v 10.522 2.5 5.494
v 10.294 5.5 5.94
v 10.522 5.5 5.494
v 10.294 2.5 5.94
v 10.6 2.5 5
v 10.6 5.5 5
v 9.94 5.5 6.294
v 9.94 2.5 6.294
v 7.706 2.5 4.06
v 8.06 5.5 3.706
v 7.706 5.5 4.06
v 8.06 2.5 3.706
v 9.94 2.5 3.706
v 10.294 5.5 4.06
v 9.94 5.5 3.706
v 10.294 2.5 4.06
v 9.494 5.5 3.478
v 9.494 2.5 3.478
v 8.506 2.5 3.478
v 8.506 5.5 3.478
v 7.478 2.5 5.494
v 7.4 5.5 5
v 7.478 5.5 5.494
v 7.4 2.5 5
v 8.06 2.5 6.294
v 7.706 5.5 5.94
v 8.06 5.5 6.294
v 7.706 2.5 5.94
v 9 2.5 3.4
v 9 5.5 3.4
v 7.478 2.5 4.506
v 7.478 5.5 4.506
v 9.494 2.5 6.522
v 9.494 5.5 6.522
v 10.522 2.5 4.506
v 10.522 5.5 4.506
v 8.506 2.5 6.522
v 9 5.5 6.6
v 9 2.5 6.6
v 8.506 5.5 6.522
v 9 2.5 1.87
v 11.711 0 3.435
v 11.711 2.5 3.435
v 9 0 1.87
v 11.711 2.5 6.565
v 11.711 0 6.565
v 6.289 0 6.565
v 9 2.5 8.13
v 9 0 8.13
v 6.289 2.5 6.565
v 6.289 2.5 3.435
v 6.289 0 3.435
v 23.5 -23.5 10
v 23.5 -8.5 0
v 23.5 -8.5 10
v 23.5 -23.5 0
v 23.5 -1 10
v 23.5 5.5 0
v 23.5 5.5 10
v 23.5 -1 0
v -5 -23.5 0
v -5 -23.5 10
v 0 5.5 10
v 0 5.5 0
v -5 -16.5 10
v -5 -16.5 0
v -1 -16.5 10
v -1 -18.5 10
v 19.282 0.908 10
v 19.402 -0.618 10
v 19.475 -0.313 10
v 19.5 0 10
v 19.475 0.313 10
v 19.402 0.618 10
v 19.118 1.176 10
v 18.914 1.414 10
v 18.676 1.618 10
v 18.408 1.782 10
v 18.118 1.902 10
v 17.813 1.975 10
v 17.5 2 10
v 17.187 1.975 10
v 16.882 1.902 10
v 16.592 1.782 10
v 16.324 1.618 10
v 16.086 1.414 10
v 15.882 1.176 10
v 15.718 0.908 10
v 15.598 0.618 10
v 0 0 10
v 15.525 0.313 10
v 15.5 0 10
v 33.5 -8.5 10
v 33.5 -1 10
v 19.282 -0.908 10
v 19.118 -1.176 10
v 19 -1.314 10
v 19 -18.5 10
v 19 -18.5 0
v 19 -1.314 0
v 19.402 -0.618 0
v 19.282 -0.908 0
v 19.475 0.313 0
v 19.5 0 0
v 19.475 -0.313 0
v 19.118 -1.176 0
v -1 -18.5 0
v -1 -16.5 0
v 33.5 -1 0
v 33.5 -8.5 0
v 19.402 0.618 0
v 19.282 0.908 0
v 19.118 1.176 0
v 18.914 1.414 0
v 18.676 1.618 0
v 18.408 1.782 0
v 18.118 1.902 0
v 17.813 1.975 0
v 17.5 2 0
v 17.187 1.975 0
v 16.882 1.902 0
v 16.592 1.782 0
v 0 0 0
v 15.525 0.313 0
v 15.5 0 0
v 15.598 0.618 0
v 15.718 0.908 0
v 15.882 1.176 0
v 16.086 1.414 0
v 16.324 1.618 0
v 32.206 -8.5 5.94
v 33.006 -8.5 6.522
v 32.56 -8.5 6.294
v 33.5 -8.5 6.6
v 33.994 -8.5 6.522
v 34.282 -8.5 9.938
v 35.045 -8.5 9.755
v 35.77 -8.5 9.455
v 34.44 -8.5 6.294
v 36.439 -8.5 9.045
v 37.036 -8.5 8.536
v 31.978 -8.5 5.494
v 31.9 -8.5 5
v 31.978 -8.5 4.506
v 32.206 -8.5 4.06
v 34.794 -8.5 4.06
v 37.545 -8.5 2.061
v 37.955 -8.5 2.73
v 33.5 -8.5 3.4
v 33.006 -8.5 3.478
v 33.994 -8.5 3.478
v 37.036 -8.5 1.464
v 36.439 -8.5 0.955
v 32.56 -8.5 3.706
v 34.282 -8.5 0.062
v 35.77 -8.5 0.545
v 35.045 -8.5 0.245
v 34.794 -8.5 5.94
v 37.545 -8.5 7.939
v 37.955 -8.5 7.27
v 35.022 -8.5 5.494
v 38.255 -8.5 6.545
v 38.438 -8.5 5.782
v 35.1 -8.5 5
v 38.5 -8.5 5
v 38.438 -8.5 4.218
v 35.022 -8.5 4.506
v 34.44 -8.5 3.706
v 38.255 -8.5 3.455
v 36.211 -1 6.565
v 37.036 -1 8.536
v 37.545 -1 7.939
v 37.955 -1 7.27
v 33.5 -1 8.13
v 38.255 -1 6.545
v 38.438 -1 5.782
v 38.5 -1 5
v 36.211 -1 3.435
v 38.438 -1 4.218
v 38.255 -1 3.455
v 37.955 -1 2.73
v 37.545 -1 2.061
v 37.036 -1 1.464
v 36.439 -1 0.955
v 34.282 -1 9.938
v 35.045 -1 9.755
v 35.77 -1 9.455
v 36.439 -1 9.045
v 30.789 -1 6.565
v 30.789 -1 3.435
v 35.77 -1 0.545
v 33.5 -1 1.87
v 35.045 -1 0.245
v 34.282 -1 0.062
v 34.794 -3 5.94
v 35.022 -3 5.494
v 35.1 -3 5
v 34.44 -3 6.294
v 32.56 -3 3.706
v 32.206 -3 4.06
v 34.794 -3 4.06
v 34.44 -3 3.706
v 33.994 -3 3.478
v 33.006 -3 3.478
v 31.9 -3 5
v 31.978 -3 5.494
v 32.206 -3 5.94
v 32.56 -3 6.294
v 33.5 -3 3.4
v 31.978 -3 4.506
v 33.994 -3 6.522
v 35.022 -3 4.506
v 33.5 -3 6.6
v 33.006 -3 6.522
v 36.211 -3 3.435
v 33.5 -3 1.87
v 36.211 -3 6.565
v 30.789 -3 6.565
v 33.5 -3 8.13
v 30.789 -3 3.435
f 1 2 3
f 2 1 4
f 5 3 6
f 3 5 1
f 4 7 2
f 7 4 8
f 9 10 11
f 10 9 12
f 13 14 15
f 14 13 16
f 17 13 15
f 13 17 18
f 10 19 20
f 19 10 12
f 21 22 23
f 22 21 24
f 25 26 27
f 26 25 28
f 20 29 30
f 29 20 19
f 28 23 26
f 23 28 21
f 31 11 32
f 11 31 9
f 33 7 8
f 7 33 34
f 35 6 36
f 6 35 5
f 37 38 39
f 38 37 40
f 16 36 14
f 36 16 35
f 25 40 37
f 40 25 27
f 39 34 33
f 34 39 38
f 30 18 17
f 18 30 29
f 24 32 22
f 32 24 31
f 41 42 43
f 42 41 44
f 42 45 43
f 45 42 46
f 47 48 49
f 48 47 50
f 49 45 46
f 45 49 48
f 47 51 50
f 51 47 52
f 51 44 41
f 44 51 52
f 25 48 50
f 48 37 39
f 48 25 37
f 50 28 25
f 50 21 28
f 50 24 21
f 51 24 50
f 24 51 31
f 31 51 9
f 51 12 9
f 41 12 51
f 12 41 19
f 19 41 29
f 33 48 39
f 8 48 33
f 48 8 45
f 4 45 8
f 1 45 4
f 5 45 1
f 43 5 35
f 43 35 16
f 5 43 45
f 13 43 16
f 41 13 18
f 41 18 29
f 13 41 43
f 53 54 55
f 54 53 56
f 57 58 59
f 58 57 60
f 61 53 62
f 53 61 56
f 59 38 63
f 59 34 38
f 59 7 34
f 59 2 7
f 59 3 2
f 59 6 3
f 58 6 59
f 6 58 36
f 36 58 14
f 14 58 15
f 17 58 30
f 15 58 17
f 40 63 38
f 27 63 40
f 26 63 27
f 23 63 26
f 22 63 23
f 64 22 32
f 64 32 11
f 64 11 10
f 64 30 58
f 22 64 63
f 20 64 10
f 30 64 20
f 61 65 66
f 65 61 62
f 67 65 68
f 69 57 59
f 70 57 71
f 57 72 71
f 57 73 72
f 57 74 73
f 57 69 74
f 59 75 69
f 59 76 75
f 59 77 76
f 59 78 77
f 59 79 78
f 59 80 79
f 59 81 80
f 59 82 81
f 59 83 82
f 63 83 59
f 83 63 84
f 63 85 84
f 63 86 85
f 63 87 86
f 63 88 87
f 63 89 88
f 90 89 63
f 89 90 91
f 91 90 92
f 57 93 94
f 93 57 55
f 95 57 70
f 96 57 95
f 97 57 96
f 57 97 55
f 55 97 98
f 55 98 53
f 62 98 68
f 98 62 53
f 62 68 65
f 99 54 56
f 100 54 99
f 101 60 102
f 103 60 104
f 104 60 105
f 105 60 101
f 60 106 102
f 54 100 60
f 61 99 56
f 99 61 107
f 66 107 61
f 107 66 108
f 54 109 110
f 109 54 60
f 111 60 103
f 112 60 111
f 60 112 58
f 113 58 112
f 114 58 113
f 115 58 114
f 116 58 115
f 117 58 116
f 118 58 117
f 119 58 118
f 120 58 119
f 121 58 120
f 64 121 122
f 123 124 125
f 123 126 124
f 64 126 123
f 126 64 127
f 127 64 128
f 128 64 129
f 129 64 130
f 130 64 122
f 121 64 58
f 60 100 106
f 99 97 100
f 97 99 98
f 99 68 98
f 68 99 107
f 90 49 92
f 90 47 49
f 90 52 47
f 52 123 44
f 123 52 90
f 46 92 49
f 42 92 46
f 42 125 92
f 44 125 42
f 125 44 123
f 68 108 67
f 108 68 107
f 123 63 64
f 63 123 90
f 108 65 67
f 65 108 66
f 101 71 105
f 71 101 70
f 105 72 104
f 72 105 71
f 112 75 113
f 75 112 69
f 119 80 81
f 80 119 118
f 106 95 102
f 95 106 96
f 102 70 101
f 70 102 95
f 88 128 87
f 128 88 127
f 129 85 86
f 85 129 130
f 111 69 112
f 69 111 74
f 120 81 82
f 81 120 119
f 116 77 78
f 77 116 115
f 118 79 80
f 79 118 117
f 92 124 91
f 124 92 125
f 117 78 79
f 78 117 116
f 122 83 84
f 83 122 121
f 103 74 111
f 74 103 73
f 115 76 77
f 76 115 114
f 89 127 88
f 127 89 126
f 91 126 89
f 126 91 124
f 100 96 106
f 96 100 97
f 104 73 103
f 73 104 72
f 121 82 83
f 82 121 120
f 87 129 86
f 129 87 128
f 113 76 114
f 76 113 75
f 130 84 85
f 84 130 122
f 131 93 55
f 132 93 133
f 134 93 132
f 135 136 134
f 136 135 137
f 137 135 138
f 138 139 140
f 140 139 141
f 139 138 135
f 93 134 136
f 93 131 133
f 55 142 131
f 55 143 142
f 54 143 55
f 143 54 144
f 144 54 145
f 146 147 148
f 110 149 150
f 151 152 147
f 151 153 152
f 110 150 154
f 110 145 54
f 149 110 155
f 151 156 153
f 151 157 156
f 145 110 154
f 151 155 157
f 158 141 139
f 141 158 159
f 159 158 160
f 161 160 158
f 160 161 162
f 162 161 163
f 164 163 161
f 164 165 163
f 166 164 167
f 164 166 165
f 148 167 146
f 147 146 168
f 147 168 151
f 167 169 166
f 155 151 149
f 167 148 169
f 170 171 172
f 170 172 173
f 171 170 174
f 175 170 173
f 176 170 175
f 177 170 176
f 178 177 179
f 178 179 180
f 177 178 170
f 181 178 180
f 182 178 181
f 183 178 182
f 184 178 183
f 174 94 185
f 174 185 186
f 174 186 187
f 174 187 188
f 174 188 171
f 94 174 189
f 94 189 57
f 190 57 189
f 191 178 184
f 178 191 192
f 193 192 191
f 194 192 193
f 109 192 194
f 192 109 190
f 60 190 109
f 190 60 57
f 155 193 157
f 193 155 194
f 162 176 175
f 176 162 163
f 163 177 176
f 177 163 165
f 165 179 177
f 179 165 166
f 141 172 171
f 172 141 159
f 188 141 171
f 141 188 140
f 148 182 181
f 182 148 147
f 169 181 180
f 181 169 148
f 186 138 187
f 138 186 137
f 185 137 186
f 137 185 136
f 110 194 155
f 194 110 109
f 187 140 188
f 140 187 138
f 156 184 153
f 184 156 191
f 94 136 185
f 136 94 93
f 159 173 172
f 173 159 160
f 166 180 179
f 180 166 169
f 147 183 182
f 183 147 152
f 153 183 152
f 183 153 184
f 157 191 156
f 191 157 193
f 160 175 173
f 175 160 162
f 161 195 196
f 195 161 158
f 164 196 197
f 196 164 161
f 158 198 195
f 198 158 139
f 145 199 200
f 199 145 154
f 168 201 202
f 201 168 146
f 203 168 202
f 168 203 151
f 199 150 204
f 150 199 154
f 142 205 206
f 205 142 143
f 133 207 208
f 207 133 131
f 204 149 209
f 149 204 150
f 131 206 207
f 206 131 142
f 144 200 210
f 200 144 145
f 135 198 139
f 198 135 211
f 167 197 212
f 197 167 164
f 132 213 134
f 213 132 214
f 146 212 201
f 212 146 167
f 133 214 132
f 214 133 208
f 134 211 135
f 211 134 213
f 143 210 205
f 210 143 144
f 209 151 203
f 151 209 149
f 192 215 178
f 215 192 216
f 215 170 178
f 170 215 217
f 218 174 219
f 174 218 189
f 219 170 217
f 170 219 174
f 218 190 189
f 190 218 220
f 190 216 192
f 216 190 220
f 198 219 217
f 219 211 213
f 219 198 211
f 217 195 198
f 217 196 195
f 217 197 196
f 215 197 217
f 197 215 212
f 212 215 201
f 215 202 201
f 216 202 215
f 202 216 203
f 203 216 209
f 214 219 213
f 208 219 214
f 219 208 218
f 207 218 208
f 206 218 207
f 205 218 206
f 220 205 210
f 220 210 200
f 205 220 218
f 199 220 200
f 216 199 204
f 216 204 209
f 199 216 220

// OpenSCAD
// file: inc/functions.scad
// PRUSA iteration3
// Functions used in many files
// GNU GPL v3
// Josef Průša <josefprusa@me.com>
// Václav 'ax' Hůla <axtheb@gmail.com>
// Vlnofka <>
// http://www.reprap.org/wiki/Prusa_Mendel
// http://github.com/prusajr/PrusaMendel

module roundcorner(diameter){
	difference(){
		cube(size = [diameter,diameter,99], center = false);
		translate(v = [diameter, diameter, 0]) cylinder(h = 100, r=diameter, center=true);
	}
}
module nut(d,h,horizontal=true){
    cornerdiameter =  (d / 2) / cos (180 / 6);
    cylinder(h = h, r = cornerdiameter, $fn = 6);
    if(horizontal){
        for(i = [1:6]){
            rotate([0,0,60*i]) translate([-cornerdiameter-0.2,0,0]) rotate([0,0,-45]) cube([2,2,h]);
        }
    }
}

// Based on nophead research
module polyhole(d, h, center=false) {
    n = max(round(2 * d),3);
    rotate([0,0,180])
        cylinder(h = h, r = (d / 2) / cos (180 / n), $fn = n);
}

// make it interchangeable between this and cylinder
module cylinder_poly(r, h, center=false){
    polyhole(d=r*2, h=h, center=center);
}

module fillet(radius, height=100, $fn=0) {
    //this creates acutal fillet
    translate([-radius, -radius, -height/2-0.01])
        difference() {
            cube([radius*2, radius*2, height+0.02]);
            cylinder(r=radius, h=height+0.02, $fn=$fn);
        }
}

module cube_fillet(size, radius=-1, vertical=[3,3,3,3], top=[0,0,0,0], bottom=[0,0,0,0], center=false, $fn=0){
    //
    if (center) {
        cube_fillet_inside(size, radius, vertical, top, bottom, $fn);
    } else {
        translate([size[0]/2, size[1]/2, size[2]/2])
            cube_fillet_inside(size, radius, vertical, top, bottom, $fn);
    }
}

module cube_negative_fillet(size, radius=-1, vertical=[3,3,3,3], top=[0,0,0,0], bottom=[0,0,0,0], $fn=0){

    j=[1,0,1,0];

    for (i=[0:3]) {
        if (radius > -1) {
            rotate([0, 0, 90*i]) translate([size[1-j[i]]/2, size[j[i]]/2, 0]) fillet(radius, size[2], $fn=$fn);
        } else {
            rotate([0, 0, 90*i]) translate([size[1-j[i]]/2, size[j[i]]/2, 0]) fillet(vertical[i], size[2], $fn=$fn);
        }
        rotate([90*i, -90, 0]) translate([size[2]/2, size[j[i]]/2, 0 ]) fillet(top[i], size[1-j[i]], $fn=$fn);
        rotate([90*(4-i), 90, 0]) translate([size[2]/2, size[j[i]]/2, 0]) fillet(bottom[i], size[1-j[i]], $fn=$fn);

    }
}

module cube_fillet_inside(size, radius=-1, vertical=[3,3,3,3], top=[0,0,0,0], bottom=[0,0,0,0], $fn=0){
    //makes CENTERED cube with round corners
    // if you give it radius, it will fillet vertical corners.
    //othervise use vertical, top, bottom arrays
    //when viewed from top, it starts in upper right corner (+x,+y quadrant) , goes counterclockwise
    //top/bottom fillet starts in direction of Y axis and goes CCW too


    if (radius == 0) {
        cube(size, center=true);
    } else {
        difference() {
            cube(size, center=true);
            cube_negative_fillet(size, radius, vertical, top, bottom, $fn);
        }
    }
}


module nema17(places=[1,1,1,1], size=15.5, h=10, holes=false, shadow=false, $fn=24){
    for (i=[0:3]) {
        if (places[i] == 1) {
            rotate([0, 0, 90*i]) translate([size, size, 0]) {
                if (holes) {
                    #rotate([0, 0, -90*i])  translate([0,0,-10]) screw(r=1.7, slant=false, head_drop=13, $fn=$fn, h=h+12);
                } else {
                    rotate([0, 0, -90*i]) cylinder(h=h, r=5.5, $fn=$fn);
                }
            }
        }
    }
    if (shadow != false) {
        %translate ([0, 0, shadow+21+3]) cube([42,42,42], center = true);
    //flange
        %translate ([0, 0, shadow+21+3-21-1]) cylinder(r=11,h=2, center = true, $fn=20);
    //shaft
        %translate ([0, 0, shadow+21+3-21-7]) cylinder(r=2.5,h=14, center = true);
    }
}

module screw(h=20, r=2, r_head=3.5, head_drop=0, slant=true, poly=false, $fn=0){
    //makes screw with head
    //for substraction as screw hole
    if (poly) {
        cylinder_poly(h=h, r=r, $fn=$fn);
    } else {
        cylinder(h=h, r=r, $fn=$fn);
    }
    if (slant) {
        translate([0, 0, head_drop-0.01]) cylinder(h=r_head, r2=0, r1=r_head, $fn=$fn);
    }

    if (head_drop > 0) {
        translate([0, 0, -0.01]) cylinder(h=head_drop+0.01, r=r_head, $fn=$fn);
    }
}
module screw_cylinder(r_head=5.25,r=3.25,head_drop=6.2,slant=false){
	screw(r_head=r_head,head_drop=head_drop,r=r, slant=slant);

}

//screw_cylinder();
//cube_fillet([10,20,30], vertical=[3,2,0,0], top=[3,2,0,5], bottom=[3,2,0,5]);
//cube_fillet([10,20,30], radius=2, top=[7,2,7,2]);
// file: inc/metric.scad
// PRUSA Mendel
// Default metric sizes
// GNU GPL v3
// Josef Pruša
// josefprusa@me.com
// prusadjs.cz
// http://www.reprap.org/wiki/Prusa_Mendel
// http://github.com/prusajr/PrusaMendel
// DONT CHANGE THIS FILE! ALTER VALUES IN CONFIGURATION.SCAD INSTEAD
// RODS
threaded_rod_diameter = 8.7;
threaded_rod_diameter_horizontal = 8.7;
smooth_bar_diameter = 8;
smooth_bar_diameter_horizontal = 8.5;
// Nuts and bolts
m8_diameter = 9;
m8_nut_diameter = 14.1;
m4_diameter = 4.5;
m4_nut_diameter = 9;
m3_diameter = 3.6;
m3_nut_diameter = 5.3;
m3_nut_diameter_horizontal = 6.1;
// Bushing holder
bushing_core_diameter = smooth_bar_diameter;
bushing_material_thickness = 1;
// Motors
motor_shaft = 5.5;
// file: configuration.scad
// PRUSA iteration3
// Configuration file
// GNU GPL v3
// Josef Pruša <josefprusa@me.com>
// Václav 'ax' Hula <axtheb@gmail.com>
// http://www.reprap.org/wiki/Prusa_Mendel
// http://github.com/prusajr/PrusaMendel
// PLEASE SELECT ONE OF THE CONFIGURATIONS BELOW
// BY UN-COMMENTING IT
// Uncomment for metric settings
// METRIC METRIC METRIC METRIC METRIC METRIC METRIC METRIC
include <inc/metric.scad>;
// Custom settings here, tailor to your supplies and print settings
// Select your belt type ******************************************************
//T2.5
belt_tooth_distance = 2.5;
belt_tooth_ratio = 0.5;
//T5 (strongly discouraged)
//belt_tooth_distance = 5;
//belt_tooth_ratio = 0.75;
//HTD3
//belt_tooth_distance = 3;
//belt_tooth_ratio = 0.75;
//MXL
//belt_tooth_distance = 2.032;
//belt_tooth_ratio = 0.64;
// Choose bearing/bushing configuration ***************************************
//Choose from:
// 0 = Z as lm[e]8uu, X and Y bushings
// 1 = all bushings
// 2 = all bearings [default. Do not change unless you really know what you are doing]
// DO NOT OFFER 0 or 1 VARIANTS FOR SALE. We really mean that. In the long run it hurts everyone.
bearing_choice = 2;
// Bushing version
// 0 = square igus housings. By igus we mean JFM-0810-10 or GFM-0810-10
// 1 = round igus (works better if printed precisely)
// 2 = bronze self-aligning bushings
bushing_type = 0;
//Bearing version
// 0 = default lm8uu
// 1 = lme8uu
bearing_type = 0;
// Select idler bearing size **************************************************
// 0 = 608 [standard skate bearings]
// 1 = 624 [roughly same diameter as pulley, makes belt parallel so its prettier]
idler_bearing = 0;
// Thickness of the XZ plate board
board_thickness = 16;
//Layer height * width over thickness. Used for idler sleeve
single_wall_width = 0.3*2.2;
// END of custom settings
// You are not supposed to change this
board_to_xz_distance = 26;
xaxis_rod_distance = 45;
carriage_l = 74;
carriage_hole_to_side = 5;
carriage_hole_height = 4;
//calculated from settings
idler_size = (idler_bearing == 0) ? 22 : 13;
//use 4.5 for 608, 2.5 for 624
idler_size_inner_r = (idler_bearing == 0) ? 4.5 : 2.5;
idler_width = (idler_bearing == 0) ? 9 : 5;
// CHANGE ONLY THE STUFF YOU KNOW
// IT WILL REPLACE DEFAULT SETTING
// RODS
// threaded_rod_diameter = 0;
// threaded_rod_diameter_horizontal = 0;
// smooth_bar_diameter = 0;
// smooth_bar_diameter_horizontal = 0;
// Nuts and bolts
// m8_diameter = 0;
// m8_nut_diameter = 0;
// m4_diameter = 0;
// m4_nut_diameter = 0;
// m3_diameter = 0;
// m3_nut_diameter = 0;
// Bushing holder
// bushing_core_diameter = smooth_bar_diameter;
// bushing_material_thickness = 0;
///counted stuff
m3_nut_diameter_bigger = ((m3_nut_diameter / 2) / cos (180 / 6))*2;
// functions
include <inc/functions.scad>
// These constants define the geometry of the complete-printer.scad
x_smooth_rod_length=325;
y_smooth_rod_length=405;
z_smooth_rod_length=235;
bed_x_size=225;
bed_y_size=225;
// main file
include <configuration.scad>

m3_diameter = 3.2;
m3_nut_diameter = m3_diameter * 1.8 + .5;
m3_nut_diameter_bigger = m3_nut_diameter;
xend_height=18;
xend_length=40;
z_stop_mount_hole_depth=xend_height;
z_stop_mount_hole_height=xend_height;
z_stop_mount_thick=5.5;
z_stop_mount_space=.5;
z_stop_mount_width=10;
z_stop_wing_length=15;

zcompanion();

//translate([45,-33,0])
//rotate ([0,0,180]) 
//zcompanion();

module zcompanion()
{
	rotate ([90,0,0]) 
	translate([0,0,0])
	zmount();
	//translate([8,-8,0]) zboot();
}

module zmount()
{
	difference()
	{
		translate([-5,0,-z_stop_mount_thick]) 
		cube(size = [	z_stop_mount_hole_depth+z_stop_mount_thick+5,
			 			z_stop_mount_width,
						xend_height+2*z_stop_mount_thick]);
		translate([-1,-1,0]) 
		cube(size = [	z_stop_mount_hole_depth+2,
				 		z_stop_mount_width+2,
						xend_height+z_stop_mount_space]);

		translate([-xend_height,-1,-xend_height]) 
		cube(size = [	xend_height,
				 		z_stop_mount_width+2,
						2*xend_height+z_stop_mount_space-2]);

		translate([z_stop_mount_hole_depth/2,z_stop_mount_width/2,-2.5])
		mount_screw_hole();
		translate([xend_height+z_stop_mount_space-1,z_stop_mount_width+1,0])
		rotate([90,0,0])
		cylinder(h=z_stop_mount_width+2, 
				r=2, 
				$fn=40);
		
	}


	translate([	z_stop_mount_hole_depth+z_stop_mount_thick,
				0,
				1]) { //-z_stop_mount_thick]) {
		difference()
		{
			union() 
			{
				cube(size = [	z_stop_wing_length-z_stop_mount_width/2,
			 					z_stop_mount_width,
								z_stop_mount_thick+2]);
				translate([		z_stop_wing_length-z_stop_mount_width/2,
								z_stop_mount_width/2,
								0])
				cylinder(	h=z_stop_mount_thick+2, 
							r=z_stop_mount_width/2, 
							$fn=40);
			
			}
			translate([	z_stop_wing_length-z_stop_mount_width/2,
						z_stop_mount_width/2,
						-z_stop_mount_thick+0.5])
			z_stop_screw_hole();

		}

	}	
}

module zboot()
{
	difference()
	{
		union()
		{
			translate([0,0,2]) 
			cylinder(h=7, r1=5, r2=m3_diameter/2+1, $fn=40);
			cylinder(h=2, r=5, $fn=40);
		}
		translate([0,0,6]) 
		cylinder(h=7, r=m3_diameter/2-0.1, $fn=40);
	}
}

module mount_screw_hole()
{
	translate(v=[0, 0, -5])
	cylinder(r=m3_diameter/2, h=12,$fn=20);
	translate(v=[0, 0, 0]) 
	rotate([0,0,30])
	cylinder(h=7, r=m3_nut_diameter_bigger/2, $fn=6);
}

module z_stop_screw_hole()
{
	translate(v=[0, 0, 5])
	cylinder(r=m3_diameter/2, h=12,$fn=20);
	translate(v=[0, 0, 0]) 
	rotate([0,0,30])
	cylinder(h=7, r=m3_nut_diameter_bigger/2, $fn=6);
}
